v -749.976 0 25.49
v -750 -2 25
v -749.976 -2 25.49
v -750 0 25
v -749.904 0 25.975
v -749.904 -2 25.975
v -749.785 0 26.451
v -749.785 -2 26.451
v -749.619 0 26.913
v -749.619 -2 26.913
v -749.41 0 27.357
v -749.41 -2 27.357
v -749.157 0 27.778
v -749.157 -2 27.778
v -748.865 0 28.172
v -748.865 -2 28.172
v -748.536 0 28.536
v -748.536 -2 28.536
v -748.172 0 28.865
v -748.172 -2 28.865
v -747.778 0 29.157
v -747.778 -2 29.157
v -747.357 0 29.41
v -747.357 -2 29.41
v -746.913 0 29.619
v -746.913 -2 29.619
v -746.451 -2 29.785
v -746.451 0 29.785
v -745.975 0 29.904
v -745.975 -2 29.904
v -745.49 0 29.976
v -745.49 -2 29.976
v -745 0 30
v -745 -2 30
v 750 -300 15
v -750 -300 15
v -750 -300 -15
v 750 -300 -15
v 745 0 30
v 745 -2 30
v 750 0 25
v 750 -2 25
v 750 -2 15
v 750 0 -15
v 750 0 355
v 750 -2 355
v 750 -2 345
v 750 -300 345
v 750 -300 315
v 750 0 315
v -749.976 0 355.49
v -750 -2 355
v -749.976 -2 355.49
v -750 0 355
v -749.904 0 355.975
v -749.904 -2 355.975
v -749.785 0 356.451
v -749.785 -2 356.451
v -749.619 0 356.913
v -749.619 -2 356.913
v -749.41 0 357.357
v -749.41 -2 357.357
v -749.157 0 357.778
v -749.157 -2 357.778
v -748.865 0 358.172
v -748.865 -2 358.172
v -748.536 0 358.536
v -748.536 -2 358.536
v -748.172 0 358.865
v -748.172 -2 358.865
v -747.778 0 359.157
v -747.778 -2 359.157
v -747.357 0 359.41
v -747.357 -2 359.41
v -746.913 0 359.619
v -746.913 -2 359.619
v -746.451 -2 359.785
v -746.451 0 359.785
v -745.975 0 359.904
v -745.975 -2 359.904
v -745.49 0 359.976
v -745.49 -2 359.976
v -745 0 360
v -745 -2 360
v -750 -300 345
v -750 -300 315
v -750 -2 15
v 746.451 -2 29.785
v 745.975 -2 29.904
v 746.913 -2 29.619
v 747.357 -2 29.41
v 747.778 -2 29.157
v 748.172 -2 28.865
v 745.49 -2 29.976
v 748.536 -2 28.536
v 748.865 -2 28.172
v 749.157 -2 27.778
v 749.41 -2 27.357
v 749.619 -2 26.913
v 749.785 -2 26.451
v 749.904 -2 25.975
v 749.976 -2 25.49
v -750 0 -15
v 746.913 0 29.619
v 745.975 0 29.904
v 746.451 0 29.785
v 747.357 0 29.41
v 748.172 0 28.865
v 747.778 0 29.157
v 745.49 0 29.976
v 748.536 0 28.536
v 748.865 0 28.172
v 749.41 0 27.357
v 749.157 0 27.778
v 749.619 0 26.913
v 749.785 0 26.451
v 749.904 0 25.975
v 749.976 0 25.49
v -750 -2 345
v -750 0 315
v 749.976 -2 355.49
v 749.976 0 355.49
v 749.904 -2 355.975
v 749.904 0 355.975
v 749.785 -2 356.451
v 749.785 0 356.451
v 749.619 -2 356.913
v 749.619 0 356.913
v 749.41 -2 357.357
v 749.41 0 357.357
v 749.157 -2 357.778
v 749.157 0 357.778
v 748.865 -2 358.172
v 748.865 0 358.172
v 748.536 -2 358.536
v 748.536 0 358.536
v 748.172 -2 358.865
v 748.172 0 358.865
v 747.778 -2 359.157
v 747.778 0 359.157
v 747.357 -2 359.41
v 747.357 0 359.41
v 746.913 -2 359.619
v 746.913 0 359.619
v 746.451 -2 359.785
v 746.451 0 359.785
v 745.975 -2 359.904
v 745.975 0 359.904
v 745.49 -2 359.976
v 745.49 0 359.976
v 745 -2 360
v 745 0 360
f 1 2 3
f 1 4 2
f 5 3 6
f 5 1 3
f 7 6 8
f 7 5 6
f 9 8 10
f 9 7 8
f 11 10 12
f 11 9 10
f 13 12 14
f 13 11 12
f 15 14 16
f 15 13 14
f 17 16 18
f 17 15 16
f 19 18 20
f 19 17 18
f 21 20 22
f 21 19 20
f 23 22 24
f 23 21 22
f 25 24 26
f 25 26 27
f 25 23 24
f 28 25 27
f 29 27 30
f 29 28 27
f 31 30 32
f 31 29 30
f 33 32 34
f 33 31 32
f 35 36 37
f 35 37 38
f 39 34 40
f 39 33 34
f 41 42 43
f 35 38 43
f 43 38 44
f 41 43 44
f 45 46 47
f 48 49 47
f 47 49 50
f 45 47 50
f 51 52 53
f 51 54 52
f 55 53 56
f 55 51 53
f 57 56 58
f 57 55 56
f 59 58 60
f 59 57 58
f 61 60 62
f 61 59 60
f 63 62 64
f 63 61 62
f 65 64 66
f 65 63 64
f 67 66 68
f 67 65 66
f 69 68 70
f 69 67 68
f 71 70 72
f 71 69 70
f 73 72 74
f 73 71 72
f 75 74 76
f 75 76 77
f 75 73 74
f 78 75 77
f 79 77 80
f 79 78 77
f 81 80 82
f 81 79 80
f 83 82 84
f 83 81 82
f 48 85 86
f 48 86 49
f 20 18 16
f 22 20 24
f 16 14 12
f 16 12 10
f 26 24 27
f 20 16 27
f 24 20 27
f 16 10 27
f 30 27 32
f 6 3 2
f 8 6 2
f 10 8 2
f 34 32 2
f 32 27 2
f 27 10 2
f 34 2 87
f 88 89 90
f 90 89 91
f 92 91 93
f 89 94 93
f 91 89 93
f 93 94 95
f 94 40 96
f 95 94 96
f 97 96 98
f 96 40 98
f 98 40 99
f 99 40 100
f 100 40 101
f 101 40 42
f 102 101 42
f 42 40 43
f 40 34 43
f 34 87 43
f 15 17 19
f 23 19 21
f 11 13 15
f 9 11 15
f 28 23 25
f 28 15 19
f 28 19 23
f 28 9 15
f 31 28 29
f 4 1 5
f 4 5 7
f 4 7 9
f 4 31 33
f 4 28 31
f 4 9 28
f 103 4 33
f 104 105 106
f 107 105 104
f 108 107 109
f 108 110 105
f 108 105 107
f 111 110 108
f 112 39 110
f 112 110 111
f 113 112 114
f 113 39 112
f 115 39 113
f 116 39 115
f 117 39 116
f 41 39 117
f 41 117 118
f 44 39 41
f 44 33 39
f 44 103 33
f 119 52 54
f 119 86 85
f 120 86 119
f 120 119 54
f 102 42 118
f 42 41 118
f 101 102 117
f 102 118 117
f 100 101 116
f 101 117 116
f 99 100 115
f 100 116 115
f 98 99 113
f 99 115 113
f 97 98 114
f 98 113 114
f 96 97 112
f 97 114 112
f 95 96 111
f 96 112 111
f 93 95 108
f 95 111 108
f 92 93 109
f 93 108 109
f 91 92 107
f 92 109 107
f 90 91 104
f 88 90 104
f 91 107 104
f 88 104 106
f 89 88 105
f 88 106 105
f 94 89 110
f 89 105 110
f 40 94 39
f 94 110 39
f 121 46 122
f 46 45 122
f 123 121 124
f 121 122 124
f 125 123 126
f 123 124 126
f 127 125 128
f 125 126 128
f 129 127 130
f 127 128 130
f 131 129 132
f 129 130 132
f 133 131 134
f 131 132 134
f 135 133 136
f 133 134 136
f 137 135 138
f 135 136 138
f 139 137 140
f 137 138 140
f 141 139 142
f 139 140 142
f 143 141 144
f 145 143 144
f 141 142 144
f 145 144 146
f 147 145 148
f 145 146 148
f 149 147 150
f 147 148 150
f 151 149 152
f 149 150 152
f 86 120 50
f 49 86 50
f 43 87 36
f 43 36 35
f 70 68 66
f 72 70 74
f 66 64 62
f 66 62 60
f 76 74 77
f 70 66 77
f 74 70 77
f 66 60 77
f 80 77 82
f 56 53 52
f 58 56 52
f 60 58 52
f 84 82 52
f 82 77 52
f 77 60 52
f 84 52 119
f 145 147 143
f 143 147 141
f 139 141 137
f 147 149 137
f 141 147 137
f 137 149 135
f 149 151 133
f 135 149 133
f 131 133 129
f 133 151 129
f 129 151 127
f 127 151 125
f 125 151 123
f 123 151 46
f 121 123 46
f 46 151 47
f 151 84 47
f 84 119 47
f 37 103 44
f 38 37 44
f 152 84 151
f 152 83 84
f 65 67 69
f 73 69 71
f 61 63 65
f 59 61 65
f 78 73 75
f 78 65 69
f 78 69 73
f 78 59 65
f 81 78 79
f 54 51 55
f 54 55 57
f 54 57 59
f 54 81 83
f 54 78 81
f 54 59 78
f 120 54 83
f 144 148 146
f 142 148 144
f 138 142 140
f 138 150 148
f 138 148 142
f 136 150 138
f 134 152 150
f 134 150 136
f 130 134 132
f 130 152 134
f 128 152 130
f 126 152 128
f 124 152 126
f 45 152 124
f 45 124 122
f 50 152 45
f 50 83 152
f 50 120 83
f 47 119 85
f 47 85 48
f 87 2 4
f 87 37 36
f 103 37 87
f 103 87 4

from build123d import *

# Parameters (mm, degrees)
F0_W     = 1500
F0_H     = 30
F1_DEPTH = 300
F2_W     = 1500
F2_H     = 2
F3_DEPTH = 15
F4_W     = 1500
F4_H     = 2
F5_DEPTH = 15
F6_R     = 5


with BuildPart() as f1:
    # F0 (on Front) → F1 (new body)
    with BuildSketch(Plane.XZ):
        Rectangle(F0_W, F0_H)
        with Locations((0, 330)):
            Rectangle(F0_W, F0_H)
    extrude(amount=F1_DEPTH)

    # F2 (on face) → F3 (join)
    with BuildSketch(Plane.XY.offset(345)):
        with Locations((0, -1)):
            Rectangle(F2_W, F2_H)
    extrude(amount=F3_DEPTH)

    # F4 (on face) → F5 (join)
    with BuildSketch(Plane.XY.offset(15)):
        with Locations((0, -1)):
            Rectangle(F4_W, F4_H)
    extrude(amount=F5_DEPTH)

    # F6
    f6_edges = [f1.edges().sort_by_distance(p)[0] for p in [
        (-750, -1, 360),
        (-750, -1, 30),
        (750, -1, 360),
        (750, -1, 30),
    ]]
    fillet(f6_edges, radius=F6_R)


solid = f1.part
